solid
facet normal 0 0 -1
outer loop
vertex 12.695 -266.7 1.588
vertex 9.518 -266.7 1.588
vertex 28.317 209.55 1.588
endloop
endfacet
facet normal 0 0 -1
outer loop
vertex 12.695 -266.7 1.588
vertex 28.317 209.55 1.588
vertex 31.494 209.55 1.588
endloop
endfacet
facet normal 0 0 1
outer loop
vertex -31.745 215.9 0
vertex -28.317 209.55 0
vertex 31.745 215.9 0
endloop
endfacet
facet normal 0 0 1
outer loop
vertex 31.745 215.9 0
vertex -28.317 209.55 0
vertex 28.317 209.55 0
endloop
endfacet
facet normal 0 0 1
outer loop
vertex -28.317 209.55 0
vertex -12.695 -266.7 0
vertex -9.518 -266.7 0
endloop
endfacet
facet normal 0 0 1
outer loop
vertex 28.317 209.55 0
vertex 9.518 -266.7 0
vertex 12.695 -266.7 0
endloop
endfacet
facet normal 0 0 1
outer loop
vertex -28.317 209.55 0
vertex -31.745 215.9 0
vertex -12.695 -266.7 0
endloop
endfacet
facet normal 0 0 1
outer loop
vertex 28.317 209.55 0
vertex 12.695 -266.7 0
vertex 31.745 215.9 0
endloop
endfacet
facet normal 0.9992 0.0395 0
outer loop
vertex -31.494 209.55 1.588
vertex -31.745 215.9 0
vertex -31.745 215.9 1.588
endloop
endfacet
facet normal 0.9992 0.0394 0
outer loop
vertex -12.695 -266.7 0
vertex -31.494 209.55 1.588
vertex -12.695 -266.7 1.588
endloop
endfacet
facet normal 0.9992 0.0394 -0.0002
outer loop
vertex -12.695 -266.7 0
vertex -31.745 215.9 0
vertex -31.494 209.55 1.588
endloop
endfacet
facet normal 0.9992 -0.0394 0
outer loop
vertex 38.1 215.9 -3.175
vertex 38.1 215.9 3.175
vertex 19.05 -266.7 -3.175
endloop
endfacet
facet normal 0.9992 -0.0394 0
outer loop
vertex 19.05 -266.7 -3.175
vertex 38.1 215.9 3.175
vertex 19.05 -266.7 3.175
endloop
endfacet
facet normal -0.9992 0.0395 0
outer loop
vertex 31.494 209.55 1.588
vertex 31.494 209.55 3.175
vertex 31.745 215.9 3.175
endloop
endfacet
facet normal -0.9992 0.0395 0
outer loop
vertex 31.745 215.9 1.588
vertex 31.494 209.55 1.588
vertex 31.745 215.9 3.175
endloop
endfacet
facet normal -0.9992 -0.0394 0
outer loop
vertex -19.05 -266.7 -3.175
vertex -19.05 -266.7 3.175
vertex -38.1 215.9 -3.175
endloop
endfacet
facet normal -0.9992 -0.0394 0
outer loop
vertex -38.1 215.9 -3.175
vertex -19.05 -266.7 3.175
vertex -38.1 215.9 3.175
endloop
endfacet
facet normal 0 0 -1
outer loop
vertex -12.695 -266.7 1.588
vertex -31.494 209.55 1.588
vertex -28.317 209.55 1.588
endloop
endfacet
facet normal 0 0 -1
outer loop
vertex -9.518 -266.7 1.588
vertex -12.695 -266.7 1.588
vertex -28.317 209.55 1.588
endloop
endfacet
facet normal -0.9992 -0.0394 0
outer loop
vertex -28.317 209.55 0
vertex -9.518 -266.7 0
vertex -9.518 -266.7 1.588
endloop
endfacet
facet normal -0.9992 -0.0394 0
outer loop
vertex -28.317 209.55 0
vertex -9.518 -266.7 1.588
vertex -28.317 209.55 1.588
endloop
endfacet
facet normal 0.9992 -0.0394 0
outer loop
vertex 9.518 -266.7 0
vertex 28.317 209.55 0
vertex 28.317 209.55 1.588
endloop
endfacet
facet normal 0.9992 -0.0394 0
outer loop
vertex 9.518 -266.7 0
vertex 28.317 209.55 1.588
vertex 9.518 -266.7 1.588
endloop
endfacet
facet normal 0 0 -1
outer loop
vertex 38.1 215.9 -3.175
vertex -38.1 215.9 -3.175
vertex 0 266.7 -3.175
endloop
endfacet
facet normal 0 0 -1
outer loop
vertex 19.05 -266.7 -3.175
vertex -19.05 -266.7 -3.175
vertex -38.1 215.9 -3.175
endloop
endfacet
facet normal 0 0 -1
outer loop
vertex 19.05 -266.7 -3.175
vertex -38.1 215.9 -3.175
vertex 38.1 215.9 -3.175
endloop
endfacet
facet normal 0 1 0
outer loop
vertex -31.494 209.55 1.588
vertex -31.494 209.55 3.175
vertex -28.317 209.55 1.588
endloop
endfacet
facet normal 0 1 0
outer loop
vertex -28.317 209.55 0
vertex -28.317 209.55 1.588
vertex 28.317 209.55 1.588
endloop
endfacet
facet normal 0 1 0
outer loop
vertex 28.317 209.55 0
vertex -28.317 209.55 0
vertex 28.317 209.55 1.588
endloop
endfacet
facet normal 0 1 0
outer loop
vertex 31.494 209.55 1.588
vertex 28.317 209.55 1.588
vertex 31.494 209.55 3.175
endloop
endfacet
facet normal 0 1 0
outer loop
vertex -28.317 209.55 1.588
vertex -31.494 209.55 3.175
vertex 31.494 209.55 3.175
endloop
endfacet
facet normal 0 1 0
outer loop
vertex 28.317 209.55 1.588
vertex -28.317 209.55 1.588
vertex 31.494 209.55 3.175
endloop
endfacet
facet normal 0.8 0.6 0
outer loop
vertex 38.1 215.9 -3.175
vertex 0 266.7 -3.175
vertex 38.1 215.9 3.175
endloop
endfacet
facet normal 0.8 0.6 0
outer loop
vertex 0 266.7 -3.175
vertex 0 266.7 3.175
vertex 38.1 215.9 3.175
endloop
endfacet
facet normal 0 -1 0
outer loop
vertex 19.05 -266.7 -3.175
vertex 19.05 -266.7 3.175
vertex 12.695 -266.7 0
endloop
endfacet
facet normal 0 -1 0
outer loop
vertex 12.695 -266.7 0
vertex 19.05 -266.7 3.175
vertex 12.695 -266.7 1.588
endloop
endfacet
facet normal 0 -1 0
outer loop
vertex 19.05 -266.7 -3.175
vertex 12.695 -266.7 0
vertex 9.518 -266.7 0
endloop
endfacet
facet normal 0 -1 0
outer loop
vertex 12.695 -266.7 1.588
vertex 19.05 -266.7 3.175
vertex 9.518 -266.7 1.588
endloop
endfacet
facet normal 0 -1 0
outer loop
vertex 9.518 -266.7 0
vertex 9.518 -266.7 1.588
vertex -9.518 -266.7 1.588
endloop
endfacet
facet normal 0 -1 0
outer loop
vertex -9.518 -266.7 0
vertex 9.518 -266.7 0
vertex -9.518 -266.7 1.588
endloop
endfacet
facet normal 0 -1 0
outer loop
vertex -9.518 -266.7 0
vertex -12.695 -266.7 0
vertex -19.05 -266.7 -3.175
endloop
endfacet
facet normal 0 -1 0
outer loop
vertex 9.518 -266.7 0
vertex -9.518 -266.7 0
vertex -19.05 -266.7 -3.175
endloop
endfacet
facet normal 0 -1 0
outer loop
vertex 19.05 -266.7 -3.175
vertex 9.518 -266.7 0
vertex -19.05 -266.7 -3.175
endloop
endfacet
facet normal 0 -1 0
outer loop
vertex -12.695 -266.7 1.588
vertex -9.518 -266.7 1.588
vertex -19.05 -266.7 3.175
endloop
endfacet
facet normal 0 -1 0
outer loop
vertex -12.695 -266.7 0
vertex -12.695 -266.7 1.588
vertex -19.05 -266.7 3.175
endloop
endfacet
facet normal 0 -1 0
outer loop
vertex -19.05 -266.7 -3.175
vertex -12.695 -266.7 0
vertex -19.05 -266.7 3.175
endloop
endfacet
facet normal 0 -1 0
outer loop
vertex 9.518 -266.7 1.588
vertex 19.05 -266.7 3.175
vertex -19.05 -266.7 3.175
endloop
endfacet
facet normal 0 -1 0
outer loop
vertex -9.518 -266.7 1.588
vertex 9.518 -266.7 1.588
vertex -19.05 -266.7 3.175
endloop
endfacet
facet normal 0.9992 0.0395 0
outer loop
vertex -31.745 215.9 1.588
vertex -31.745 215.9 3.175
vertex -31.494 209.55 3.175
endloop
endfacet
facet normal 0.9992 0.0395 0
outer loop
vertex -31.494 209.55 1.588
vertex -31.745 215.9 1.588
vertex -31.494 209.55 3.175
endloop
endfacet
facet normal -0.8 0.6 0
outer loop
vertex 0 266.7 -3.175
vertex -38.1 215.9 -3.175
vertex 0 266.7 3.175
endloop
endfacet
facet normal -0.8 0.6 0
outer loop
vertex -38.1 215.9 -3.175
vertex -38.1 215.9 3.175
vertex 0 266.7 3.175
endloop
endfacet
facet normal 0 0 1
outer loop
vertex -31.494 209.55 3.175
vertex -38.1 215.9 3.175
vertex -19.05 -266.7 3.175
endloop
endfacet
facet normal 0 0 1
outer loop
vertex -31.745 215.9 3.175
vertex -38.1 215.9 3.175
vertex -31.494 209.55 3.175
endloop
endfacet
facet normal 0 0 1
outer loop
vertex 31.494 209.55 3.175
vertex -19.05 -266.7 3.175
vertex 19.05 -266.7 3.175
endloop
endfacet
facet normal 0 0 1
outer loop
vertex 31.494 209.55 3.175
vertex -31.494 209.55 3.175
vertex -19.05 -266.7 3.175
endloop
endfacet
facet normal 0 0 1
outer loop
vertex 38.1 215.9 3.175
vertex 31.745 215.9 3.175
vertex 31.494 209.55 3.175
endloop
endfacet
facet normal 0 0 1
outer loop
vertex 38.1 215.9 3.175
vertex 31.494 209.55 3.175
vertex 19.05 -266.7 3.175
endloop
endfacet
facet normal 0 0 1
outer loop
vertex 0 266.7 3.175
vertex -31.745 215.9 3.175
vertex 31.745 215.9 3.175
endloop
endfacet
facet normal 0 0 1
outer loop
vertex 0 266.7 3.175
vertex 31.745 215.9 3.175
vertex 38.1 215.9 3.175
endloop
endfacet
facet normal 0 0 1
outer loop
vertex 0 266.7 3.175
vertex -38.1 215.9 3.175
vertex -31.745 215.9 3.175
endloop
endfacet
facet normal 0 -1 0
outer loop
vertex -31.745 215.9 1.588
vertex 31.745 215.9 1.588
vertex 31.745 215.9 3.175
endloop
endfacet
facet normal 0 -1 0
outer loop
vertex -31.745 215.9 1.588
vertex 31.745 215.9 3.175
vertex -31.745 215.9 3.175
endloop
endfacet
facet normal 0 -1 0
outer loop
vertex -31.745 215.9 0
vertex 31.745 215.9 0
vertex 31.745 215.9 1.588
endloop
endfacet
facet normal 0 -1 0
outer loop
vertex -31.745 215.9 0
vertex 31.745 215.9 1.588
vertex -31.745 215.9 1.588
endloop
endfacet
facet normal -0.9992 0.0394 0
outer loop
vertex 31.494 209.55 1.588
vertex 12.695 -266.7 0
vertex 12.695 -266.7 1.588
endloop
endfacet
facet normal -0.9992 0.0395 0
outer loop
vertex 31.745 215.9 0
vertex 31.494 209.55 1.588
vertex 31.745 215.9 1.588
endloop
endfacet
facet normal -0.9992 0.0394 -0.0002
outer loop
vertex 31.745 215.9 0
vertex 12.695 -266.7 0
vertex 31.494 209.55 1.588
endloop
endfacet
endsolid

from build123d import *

# Parameters (mm, degrees)
F1_DEPTH = 3.175
F3_DEPTH = 1.5875
F5_DEPTH = 3.175
F7_DEPTH = 3.175


with BuildPart() as f1:
    # F0 (on Top) → F1 (new body)
    with BuildSketch(Plane.XY):
        Polygon((0, 266.7), (-38.1, 215.9), (-19.05, -266.7), (19.05, -266.7), (38.1, 215.9), align=None)
    extrude(amount=F1_DEPTH)

    # F2 (on Top) → F3 (cut)
    with BuildSketch(Plane.XY):
        Polygon((31.745055, 215.9), (-31.745055, 215.9), (-12.685168, -266.950463), (-9.512639, -266.825231), (-28.316924, 209.55), (28.316924, 209.55), (9.517582, -266.7), (12.690111, -266.825231), align=None)
    extrude(amount=F3_DEPTH, mode=Mode.SUBTRACT)

    # F4 (on face) → F5 (cut)
    with BuildSketch(Plane.XY.offset(3.175)):
        Polygon((31.745055, 215.9), (-31.745055, 215.9), (-31.494397, 209.55), (31.494397, 209.55), align=None)
    extrude(amount=-F5_DEPTH, mode=Mode.SUBTRACT)

    # F6 (on face) → F7 (join)
    with BuildSketch(Plane(origin=(0, 0, 0), x_dir=(1, 0, 0), z_dir=(0, 0, -1))):
        Polygon((-19.05, 266.7), (-38.1, -215.9), (0, -266.7), (38.1, -215.9), (19.05, 266.7), align=None)
    extrude(amount=F7_DEPTH)


solid = f1.part
